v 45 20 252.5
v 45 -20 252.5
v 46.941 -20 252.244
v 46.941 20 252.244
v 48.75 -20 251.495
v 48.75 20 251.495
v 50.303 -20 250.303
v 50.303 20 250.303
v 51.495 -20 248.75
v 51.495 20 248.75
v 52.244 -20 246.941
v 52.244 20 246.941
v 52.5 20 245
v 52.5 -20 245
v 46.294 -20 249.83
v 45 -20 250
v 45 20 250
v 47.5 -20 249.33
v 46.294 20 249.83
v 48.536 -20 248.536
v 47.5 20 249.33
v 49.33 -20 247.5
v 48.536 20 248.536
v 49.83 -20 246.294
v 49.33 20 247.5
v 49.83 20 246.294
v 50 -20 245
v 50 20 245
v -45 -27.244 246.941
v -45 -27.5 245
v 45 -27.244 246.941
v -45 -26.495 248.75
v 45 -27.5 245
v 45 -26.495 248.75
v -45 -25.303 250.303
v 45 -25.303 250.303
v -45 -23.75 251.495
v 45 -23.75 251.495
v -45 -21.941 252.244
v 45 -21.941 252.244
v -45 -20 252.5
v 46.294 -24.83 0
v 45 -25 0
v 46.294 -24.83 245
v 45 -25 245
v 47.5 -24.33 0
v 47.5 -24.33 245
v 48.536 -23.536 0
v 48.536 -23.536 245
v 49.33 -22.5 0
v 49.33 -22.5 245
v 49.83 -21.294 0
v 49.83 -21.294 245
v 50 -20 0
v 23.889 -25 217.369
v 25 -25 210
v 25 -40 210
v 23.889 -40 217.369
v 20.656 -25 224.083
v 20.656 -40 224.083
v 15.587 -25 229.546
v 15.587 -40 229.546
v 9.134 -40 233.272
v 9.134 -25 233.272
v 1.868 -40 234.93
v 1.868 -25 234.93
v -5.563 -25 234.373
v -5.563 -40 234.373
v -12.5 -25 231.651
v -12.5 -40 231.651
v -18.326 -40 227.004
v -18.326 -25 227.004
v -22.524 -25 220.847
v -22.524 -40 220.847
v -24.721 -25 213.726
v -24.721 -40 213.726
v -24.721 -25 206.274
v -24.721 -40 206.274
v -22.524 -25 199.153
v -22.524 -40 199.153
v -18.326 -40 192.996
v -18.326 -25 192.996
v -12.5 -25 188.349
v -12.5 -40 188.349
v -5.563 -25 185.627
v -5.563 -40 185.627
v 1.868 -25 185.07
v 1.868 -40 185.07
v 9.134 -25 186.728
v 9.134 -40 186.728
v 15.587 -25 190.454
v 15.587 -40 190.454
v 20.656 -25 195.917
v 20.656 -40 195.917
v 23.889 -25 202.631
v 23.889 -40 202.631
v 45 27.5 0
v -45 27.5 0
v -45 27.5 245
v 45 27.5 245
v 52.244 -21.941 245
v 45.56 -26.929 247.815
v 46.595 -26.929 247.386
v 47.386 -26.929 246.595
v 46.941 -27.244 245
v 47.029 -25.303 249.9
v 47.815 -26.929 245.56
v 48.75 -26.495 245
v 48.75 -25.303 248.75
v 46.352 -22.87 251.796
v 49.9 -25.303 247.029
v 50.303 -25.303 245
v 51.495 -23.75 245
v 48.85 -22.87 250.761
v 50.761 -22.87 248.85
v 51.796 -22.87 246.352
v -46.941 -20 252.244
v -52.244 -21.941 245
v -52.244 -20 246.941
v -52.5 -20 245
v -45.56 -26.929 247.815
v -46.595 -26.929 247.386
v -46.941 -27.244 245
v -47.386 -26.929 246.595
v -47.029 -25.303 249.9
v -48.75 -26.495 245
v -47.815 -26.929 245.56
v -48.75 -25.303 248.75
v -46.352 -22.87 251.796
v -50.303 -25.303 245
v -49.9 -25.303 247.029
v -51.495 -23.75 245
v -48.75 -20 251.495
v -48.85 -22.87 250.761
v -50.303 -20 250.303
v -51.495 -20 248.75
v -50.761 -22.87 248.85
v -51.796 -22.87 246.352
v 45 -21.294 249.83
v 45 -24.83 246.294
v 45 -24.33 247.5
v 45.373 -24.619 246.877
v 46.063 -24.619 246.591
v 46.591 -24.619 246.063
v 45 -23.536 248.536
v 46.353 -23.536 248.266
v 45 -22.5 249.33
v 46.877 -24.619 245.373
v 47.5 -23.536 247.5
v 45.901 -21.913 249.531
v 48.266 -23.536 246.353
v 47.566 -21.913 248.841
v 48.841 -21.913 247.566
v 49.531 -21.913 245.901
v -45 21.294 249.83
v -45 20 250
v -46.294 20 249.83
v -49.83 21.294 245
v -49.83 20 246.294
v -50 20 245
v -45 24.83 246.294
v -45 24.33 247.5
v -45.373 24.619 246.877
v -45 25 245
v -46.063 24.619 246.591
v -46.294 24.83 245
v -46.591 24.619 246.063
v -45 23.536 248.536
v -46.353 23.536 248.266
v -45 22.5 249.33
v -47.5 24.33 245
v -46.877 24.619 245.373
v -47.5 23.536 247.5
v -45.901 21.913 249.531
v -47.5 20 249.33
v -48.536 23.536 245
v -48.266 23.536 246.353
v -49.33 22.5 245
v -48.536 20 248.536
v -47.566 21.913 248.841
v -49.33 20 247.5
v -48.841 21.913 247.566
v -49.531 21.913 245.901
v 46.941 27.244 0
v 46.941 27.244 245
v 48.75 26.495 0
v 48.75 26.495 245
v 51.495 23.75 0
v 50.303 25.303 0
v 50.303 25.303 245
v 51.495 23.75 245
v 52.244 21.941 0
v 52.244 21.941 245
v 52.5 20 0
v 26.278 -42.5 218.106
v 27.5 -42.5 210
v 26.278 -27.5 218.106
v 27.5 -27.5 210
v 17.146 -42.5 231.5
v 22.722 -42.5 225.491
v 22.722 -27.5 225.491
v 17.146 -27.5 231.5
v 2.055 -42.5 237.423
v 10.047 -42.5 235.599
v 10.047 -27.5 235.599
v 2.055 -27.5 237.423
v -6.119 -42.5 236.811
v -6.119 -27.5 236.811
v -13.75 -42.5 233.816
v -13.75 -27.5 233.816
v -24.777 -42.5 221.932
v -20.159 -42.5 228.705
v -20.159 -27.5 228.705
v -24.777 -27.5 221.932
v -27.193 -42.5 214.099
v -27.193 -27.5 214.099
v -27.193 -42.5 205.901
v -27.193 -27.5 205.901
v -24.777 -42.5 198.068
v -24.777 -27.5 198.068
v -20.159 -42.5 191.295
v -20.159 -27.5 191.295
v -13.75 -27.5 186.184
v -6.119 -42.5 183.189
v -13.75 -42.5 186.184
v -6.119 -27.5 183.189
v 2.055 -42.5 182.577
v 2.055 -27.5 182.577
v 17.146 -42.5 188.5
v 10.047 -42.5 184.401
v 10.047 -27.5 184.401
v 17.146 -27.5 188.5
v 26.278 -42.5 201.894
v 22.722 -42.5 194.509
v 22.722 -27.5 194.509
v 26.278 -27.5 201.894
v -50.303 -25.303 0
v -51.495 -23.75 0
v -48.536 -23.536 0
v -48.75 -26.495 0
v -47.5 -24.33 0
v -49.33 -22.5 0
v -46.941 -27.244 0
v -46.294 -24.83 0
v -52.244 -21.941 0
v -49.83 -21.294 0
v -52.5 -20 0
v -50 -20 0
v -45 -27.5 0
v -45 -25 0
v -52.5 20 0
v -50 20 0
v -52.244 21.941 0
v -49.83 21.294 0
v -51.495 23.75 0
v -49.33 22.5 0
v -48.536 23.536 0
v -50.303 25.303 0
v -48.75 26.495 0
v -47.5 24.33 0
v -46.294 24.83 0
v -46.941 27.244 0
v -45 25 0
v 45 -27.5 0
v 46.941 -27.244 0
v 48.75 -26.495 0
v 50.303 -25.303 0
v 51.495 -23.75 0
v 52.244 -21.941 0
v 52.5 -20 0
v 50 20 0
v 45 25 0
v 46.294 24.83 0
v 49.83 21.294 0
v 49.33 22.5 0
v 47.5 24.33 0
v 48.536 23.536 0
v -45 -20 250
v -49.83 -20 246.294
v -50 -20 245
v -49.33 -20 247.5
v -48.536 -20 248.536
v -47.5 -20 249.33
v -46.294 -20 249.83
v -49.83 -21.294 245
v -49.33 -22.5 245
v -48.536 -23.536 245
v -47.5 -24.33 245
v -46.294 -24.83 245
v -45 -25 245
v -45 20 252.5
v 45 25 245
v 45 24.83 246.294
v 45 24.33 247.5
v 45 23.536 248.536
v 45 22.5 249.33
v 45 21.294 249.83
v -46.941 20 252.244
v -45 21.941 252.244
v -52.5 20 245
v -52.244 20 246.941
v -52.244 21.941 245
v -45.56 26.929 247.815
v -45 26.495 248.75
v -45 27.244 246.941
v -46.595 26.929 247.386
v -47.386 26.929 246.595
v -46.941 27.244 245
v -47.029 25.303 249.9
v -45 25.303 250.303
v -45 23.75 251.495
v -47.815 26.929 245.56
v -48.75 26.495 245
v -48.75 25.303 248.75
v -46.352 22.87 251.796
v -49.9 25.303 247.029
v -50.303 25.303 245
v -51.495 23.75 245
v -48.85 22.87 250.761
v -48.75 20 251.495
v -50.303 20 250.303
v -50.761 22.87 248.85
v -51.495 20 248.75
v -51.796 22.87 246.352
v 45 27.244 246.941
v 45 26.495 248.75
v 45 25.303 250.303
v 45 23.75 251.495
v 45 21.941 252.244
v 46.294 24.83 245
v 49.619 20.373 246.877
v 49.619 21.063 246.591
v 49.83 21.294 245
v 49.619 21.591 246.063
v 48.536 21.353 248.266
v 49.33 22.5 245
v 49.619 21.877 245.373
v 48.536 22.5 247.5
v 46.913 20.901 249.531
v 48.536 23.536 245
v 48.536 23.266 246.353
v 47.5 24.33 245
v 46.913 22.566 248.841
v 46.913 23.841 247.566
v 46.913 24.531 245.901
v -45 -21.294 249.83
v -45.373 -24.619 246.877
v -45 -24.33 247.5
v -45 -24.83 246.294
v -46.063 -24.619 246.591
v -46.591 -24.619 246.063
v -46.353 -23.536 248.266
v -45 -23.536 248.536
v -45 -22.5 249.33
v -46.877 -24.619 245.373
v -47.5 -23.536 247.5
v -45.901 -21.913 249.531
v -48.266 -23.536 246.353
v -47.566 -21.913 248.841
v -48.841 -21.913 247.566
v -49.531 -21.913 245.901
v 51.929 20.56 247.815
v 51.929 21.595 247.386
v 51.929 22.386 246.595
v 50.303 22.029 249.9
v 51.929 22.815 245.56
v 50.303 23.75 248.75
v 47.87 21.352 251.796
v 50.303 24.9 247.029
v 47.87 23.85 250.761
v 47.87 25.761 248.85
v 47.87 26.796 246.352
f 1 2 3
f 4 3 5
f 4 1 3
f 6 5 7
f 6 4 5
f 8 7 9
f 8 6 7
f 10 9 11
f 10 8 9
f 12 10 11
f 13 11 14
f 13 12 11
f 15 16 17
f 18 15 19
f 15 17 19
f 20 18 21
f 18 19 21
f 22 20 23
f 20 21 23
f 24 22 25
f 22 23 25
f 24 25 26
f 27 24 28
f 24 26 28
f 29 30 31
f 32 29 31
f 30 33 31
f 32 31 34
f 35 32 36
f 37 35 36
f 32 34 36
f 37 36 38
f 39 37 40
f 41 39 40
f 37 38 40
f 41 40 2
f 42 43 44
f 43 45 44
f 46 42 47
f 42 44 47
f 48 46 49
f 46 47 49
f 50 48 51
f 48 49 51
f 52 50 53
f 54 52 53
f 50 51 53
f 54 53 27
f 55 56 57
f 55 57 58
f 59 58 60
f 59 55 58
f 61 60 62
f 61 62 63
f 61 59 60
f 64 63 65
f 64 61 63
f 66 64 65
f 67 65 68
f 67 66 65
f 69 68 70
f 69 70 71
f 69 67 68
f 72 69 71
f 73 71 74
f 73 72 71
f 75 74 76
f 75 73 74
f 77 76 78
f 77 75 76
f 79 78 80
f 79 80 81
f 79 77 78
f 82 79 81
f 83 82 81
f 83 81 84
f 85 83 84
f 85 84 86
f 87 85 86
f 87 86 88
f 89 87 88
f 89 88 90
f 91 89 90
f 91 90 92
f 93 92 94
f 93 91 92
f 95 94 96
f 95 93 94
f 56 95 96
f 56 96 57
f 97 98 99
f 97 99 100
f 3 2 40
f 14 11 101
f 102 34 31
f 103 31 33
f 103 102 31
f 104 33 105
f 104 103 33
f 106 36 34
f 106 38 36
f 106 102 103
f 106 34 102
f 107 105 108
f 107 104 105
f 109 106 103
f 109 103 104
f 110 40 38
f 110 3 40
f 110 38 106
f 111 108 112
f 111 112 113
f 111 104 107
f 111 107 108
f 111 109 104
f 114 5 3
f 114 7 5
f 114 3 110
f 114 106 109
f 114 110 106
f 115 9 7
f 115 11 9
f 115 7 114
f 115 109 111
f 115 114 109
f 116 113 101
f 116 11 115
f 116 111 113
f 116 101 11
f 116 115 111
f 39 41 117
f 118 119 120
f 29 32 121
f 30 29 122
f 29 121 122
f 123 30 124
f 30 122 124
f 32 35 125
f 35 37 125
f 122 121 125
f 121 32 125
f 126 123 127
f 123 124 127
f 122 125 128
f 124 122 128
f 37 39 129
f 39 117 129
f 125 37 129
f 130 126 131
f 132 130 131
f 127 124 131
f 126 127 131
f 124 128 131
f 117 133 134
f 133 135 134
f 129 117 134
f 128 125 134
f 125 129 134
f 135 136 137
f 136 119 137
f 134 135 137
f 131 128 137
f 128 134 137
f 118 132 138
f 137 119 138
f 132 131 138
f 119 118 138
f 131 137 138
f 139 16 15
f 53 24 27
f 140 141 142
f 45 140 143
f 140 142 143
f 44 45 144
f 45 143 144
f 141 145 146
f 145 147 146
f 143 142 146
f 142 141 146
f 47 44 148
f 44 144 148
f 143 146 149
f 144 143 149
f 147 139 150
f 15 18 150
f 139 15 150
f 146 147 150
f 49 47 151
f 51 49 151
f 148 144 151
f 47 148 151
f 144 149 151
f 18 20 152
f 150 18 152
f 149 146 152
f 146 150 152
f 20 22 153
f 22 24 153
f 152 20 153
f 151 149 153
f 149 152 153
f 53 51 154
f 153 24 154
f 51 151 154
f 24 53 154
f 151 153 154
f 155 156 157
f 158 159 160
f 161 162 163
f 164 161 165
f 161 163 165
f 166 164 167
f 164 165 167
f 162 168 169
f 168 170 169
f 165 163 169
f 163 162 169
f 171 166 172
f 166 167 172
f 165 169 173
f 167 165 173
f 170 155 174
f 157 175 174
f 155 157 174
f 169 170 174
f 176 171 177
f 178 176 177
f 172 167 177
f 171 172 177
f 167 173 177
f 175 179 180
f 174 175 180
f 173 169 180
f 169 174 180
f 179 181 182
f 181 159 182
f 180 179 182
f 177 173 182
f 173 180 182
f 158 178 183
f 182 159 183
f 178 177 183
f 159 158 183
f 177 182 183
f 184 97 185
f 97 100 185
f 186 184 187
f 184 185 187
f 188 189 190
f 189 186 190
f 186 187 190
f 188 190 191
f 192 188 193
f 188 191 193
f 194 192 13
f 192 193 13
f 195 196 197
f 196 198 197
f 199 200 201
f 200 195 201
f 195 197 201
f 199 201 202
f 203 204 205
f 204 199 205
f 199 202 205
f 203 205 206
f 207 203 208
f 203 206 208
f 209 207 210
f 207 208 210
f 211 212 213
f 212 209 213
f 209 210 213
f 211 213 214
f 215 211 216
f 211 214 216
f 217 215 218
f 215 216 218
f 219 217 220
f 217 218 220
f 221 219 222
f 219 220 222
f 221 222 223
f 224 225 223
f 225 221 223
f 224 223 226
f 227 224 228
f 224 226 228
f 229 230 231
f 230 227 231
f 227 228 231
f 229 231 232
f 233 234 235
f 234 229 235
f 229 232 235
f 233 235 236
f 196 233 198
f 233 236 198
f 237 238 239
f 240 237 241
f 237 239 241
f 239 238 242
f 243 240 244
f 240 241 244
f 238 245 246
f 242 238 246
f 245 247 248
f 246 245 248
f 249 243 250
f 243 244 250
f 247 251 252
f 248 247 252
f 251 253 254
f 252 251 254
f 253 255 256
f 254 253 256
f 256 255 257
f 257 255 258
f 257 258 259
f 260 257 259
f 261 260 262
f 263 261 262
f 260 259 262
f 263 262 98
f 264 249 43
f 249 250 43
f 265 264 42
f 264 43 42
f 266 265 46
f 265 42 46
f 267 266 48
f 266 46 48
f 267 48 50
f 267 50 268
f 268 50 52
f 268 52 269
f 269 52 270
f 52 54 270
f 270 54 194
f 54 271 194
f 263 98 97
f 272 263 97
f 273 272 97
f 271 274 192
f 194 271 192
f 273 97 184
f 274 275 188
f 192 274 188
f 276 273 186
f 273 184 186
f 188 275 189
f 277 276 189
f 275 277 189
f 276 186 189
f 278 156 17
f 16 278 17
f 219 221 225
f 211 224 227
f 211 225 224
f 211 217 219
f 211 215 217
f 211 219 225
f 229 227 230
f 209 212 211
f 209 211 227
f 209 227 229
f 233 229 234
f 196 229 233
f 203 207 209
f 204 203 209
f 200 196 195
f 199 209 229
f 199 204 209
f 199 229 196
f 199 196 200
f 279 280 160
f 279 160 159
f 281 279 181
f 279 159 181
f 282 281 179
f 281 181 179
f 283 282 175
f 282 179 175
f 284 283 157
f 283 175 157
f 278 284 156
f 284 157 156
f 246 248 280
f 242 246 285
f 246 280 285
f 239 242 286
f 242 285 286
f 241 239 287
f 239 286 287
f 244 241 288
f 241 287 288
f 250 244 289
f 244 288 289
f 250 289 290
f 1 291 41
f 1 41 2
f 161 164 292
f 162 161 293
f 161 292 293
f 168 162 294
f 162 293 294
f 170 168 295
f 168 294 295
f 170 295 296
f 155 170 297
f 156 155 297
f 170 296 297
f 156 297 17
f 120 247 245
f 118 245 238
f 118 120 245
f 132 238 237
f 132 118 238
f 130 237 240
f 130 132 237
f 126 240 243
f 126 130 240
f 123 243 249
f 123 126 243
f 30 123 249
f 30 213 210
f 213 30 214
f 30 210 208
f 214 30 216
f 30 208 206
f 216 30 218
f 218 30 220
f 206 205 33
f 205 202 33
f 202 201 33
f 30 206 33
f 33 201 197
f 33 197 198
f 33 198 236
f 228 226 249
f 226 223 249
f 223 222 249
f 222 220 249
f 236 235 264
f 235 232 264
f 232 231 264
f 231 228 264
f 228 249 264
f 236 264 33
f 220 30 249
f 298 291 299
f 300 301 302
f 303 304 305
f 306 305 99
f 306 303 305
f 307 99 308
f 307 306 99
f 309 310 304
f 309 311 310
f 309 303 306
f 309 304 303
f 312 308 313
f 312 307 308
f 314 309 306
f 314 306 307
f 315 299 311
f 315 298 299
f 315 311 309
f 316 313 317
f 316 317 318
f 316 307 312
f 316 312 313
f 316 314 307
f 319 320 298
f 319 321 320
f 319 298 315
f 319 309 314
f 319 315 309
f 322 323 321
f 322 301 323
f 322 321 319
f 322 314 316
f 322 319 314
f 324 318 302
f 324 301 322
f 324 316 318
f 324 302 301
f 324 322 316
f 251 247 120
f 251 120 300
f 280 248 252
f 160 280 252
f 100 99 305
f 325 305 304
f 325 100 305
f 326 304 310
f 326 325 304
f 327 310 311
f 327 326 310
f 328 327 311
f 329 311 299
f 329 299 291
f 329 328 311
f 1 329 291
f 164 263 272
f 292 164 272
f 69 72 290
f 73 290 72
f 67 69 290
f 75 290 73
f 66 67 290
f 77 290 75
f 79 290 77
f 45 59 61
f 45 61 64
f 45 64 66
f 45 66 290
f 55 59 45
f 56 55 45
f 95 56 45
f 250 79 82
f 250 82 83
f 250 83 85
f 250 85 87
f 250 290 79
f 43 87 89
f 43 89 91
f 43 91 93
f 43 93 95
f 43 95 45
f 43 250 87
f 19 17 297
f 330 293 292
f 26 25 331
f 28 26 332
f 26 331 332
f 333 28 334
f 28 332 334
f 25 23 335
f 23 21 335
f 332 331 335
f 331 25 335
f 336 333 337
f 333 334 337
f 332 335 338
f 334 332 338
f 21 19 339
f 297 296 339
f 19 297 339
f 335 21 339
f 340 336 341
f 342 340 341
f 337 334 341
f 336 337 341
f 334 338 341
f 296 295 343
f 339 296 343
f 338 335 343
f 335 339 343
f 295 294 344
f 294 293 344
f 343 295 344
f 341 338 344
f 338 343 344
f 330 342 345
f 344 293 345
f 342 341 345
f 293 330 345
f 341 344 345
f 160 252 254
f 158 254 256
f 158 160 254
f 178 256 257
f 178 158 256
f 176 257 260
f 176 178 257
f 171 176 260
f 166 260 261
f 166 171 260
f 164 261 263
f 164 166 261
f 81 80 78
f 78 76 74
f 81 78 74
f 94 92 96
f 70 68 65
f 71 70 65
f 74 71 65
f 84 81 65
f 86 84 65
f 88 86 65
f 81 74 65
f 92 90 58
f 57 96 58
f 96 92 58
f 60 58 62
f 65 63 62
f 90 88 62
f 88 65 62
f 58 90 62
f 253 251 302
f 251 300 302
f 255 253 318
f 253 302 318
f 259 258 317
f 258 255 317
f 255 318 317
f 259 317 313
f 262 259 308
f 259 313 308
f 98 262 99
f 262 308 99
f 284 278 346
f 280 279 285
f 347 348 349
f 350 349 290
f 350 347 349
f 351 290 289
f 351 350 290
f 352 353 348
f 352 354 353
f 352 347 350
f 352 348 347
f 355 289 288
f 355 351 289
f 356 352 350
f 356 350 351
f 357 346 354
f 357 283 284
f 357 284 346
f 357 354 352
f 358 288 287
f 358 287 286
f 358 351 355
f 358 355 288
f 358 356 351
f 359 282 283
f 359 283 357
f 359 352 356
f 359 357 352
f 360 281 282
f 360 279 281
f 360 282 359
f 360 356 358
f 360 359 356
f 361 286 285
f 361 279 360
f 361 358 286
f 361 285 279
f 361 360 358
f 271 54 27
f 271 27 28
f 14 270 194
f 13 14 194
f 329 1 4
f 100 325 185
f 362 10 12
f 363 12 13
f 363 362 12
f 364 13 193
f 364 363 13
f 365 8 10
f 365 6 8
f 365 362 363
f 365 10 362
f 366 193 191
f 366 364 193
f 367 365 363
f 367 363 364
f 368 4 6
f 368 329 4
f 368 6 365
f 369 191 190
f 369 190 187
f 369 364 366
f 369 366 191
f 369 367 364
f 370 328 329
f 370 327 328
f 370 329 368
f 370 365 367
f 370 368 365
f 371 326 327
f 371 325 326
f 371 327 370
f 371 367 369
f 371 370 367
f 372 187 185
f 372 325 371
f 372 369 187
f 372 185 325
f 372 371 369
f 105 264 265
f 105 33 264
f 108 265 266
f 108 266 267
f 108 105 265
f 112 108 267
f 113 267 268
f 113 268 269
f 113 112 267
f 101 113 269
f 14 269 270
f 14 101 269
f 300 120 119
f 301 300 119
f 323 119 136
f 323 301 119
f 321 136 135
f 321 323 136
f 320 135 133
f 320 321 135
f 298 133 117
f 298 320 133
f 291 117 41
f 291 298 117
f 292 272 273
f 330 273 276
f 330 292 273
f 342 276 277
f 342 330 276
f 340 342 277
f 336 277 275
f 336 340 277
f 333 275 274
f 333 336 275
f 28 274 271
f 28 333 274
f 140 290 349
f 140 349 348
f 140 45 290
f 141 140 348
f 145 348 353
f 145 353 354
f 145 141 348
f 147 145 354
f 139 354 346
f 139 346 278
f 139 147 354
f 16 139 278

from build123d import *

# Parameters (mm, degrees)
F0_W     = 100
F0_H     = 50
F1_DEPTH = 250
F2_R     = 25
F3_DEPTH = 15
F4_R     = 5
F5_T     = 2.5


with BuildPart() as f1:
    # F0 (on Top) → F1 (new body)
    with BuildSketch(Plane.XY):
        Rectangle(F0_W, F0_H)
    extrude(amount=F1_DEPTH)

    # F2 (on face) → F3 (join)
    with BuildSketch(Plane.XZ.offset(25)):
        with Locations((0, 210)):
            Circle(F2_R)
    extrude(amount=F3_DEPTH)

    # F4
    f4_edges = [f1.edges().sort_by_distance(p)[0] for p in [
        (-50, 0, 250),
        (0, 25, 250),
        (50, 0, 250),
        (0, -25, 250),
        (50, -25, 125),
        (50, 25, 125),
        (-50, -25, 125),
        (-50, 25, 125),
    ]]
    fillet(f4_edges, radius=F4_R)

    # F5
    f5_openings = [f1.faces().sort_by_distance(p)[0] for p in [
        (0, 0, 0),
    ]]
    offset(amount=F5_T, openings=f5_openings, kind=Kind.INTERSECTION)


solid = f1.part
